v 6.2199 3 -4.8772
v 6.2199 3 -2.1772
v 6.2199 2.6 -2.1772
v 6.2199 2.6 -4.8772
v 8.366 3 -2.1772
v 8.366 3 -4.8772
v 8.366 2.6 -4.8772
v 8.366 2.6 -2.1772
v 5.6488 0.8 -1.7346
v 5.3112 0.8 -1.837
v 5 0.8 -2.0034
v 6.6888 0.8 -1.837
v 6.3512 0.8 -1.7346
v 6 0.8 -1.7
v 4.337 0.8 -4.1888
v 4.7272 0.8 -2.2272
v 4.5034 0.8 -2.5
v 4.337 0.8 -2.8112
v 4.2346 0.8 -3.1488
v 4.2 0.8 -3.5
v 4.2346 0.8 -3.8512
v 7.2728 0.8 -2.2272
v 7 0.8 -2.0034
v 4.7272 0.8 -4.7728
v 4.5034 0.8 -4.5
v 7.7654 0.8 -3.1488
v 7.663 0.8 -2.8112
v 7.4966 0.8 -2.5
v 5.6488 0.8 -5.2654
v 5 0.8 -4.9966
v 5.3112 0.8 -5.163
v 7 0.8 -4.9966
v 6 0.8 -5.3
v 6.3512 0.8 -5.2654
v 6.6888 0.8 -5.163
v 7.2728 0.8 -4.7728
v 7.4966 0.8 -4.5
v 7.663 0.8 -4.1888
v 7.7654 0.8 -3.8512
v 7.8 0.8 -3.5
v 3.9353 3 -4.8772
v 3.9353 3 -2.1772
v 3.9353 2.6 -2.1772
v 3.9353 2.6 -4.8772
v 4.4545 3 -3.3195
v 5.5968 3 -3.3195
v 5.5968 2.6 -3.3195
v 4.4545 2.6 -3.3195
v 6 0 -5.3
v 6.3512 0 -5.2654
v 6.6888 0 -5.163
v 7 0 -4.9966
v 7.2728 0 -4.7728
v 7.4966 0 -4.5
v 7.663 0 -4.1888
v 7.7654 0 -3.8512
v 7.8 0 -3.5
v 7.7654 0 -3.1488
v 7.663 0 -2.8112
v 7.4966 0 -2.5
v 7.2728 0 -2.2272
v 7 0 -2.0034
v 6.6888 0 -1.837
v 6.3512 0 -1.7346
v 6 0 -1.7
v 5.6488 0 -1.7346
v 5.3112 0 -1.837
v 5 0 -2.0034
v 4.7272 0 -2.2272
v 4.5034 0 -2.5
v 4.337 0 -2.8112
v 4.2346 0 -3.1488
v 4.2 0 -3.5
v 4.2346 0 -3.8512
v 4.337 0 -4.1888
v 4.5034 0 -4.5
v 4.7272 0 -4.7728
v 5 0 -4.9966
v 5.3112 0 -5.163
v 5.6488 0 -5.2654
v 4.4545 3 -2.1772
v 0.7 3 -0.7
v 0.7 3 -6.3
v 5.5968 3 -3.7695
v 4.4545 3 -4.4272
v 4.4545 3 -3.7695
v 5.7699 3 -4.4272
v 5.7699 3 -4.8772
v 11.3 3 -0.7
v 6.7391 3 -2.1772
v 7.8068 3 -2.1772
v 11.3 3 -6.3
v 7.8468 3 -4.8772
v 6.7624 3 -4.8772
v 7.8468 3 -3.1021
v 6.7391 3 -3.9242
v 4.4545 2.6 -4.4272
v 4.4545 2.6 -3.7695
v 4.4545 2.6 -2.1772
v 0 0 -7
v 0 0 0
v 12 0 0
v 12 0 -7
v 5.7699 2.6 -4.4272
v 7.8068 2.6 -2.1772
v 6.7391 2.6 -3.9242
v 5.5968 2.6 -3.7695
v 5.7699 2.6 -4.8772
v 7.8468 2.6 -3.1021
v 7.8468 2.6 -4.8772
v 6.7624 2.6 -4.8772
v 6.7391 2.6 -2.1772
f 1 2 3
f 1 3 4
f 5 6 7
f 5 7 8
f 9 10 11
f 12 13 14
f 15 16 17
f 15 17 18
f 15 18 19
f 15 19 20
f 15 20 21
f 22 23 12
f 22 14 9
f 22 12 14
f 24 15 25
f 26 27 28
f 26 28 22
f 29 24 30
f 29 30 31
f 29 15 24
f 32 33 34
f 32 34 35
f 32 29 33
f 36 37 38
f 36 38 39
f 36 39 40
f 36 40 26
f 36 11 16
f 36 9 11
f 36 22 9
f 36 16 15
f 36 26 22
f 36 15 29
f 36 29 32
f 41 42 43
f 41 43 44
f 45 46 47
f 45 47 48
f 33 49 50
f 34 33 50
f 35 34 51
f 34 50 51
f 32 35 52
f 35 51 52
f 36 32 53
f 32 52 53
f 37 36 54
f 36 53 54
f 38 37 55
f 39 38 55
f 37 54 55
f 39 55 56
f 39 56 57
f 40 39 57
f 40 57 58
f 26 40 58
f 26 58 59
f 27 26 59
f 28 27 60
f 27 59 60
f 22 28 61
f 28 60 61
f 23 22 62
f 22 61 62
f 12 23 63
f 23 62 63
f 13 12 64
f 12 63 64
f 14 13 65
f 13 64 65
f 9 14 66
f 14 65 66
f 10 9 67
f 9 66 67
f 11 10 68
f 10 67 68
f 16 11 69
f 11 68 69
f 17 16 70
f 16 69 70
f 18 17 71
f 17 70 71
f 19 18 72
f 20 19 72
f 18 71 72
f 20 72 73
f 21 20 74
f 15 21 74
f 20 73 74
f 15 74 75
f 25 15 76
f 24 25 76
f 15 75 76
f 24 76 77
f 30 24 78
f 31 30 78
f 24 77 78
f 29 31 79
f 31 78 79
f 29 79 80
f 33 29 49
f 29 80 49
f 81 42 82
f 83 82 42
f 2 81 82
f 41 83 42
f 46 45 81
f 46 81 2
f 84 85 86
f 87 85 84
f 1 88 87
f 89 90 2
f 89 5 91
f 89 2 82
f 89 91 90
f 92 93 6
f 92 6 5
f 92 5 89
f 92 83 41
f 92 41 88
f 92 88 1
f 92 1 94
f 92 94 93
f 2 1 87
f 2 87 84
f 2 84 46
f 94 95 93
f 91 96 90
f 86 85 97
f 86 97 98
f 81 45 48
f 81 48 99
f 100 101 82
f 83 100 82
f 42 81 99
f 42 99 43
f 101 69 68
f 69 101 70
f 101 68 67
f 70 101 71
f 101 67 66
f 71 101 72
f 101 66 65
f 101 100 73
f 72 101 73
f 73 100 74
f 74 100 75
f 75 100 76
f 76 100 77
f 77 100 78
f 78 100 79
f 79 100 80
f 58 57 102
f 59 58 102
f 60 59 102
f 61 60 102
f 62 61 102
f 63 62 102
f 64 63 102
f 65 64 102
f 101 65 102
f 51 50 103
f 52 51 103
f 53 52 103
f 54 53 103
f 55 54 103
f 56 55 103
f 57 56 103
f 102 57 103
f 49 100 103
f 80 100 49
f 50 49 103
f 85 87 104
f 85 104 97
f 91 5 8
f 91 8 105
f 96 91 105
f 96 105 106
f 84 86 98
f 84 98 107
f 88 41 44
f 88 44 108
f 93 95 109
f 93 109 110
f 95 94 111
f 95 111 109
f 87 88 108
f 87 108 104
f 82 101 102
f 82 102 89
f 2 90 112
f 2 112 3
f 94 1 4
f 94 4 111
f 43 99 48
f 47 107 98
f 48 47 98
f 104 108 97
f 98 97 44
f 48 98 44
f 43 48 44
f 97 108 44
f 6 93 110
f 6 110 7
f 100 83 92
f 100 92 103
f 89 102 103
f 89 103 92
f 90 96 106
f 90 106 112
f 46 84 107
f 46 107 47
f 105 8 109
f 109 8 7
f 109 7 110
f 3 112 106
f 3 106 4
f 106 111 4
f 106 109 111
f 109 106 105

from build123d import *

# Parameters (mm, degrees)
SKETCH1_W               = 12
SKETCH1_H               = 7
BOSS_EXTRUDE1_DEPTH     = 3
CUT_EXTRUDE1_DEPTH      = 7
CUT_EXTRUDE2_DEPTH      = 15.212670404
CUT_EXTRUDE2_DEPTH_BACK = 15.212670404
SKETCH4_R               = 1.8
CUT_EXTRUDE3_DEPTH      = 0.8
CUT_EXTRUDE4_DEPTH      = 0.4


with BuildPart() as part:
    # Sketch1 → Boss-Extrude1 (new body)
    with BuildSketch(Plane(origin=(0, 0, 0), x_dir=(1, 0, 0), z_dir=(0, 1, 0))):
        with Locations((6, 3.5)):
            Rectangle(SKETCH1_W, SKETCH1_H)
    extrude(amount=BOSS_EXTRUDE1_DEPTH)

    # Sketch2 → Cut-Extrude1 (cut)
    with BuildSketch(Plane.XY):
        Polygon((0, 0), (0.7, 3), (0, 3), align=None)
        Polygon((12, 0), (11.3, 3), (12, 3), align=None)
    extrude(amount=-CUT_EXTRUDE1_DEPTH, mode=Mode.SUBTRACT)

    # Sketch3 → Cut-Extrude2 (cut, two sides: drawn at the far end of the back side and taken through both)
    with BuildSketch(Plane(origin=(0, 0, 0), x_dir=(0, 0, -1), z_dir=(1, 0, 0)).offset(-CUT_EXTRUDE2_DEPTH_BACK)):
        Polygon((0, 0), (0.7, 3), (0, 3), align=None)
        Polygon((7, 3), (6.3, 3), (7, 0), align=None)
    extrude(amount=CUT_EXTRUDE2_DEPTH + CUT_EXTRUDE2_DEPTH_BACK, mode=Mode.SUBTRACT)

    # Sketch4 → Cut-Extrude3 (cut)
    with BuildSketch(Plane.XZ):
        with Locations(Location((6, -3.5, 0), (0, 0, 270))):
            Circle(SKETCH4_R)
    extrude(amount=-CUT_EXTRUDE3_DEPTH, mode=Mode.SUBTRACT)

    # Sketch5 → Cut-Extrude4 (cut)
    with BuildSketch(Plane(origin=(0, 3, 0), x_dir=(1, 0, 0), z_dir=(0, 1, 0))):
        Polygon((3.935252413, 2.177234373), (3.935252413, 4.877234373), (5.769867798, 4.877234373), (5.769867798, 4.427234373), (4.454483182, 4.427234373), (4.454483182, 3.769542065), (5.596790874, 3.769542065), (5.596790874, 3.319542065), (4.454483182, 3.319542065), (4.454483182, 2.177234373), align=None)
        Polygon((6.219867798, 2.177234373), (6.219867798, 4.877234373), (6.762355778, 4.877234373), (7.846790874, 3.102114181), (7.846790874, 4.877234373), (8.366021644, 4.877234373), (8.366021644, 2.177234373), (7.806766836, 2.177234373), (6.739098567, 3.924229565), (6.739098567, 2.177234373), align=None)
    extrude(amount=-CUT_EXTRUDE4_DEPTH, mode=Mode.SUBTRACT)


solid = part.part
